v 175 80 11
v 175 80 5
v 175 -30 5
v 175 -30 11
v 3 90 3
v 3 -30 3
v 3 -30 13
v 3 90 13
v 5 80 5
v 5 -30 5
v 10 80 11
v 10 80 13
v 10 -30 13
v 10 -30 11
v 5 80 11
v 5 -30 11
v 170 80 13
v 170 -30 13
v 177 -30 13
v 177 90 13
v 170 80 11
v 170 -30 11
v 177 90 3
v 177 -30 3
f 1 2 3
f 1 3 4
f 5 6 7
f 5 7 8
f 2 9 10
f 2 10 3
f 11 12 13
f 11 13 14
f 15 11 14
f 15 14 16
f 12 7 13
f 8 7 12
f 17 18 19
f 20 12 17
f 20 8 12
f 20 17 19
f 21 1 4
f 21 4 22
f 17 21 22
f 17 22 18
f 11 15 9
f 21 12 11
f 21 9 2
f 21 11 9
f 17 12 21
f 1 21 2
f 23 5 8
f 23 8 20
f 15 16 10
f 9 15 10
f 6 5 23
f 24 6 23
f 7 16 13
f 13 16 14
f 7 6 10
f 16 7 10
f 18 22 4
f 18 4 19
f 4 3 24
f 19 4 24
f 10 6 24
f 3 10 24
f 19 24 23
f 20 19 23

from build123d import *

# Parameters (mm, degrees)
PAD012_DEPTH = 110
BOX_W        = 174
BOX_H        = 120
BOX_DEPTH    = 10


with BuildPart() as pad012:
    # Sketch015 → Pad012 (new body)
    with BuildSketch(Plane.XZ.offset(-110)):
        Polygon((10, 12.723166), (10, 8), (5, 8), (5, 2), (175, 2), (175, 8), (170, 8), (170, 13), align=None)
    extrude(amount=PAD012_DEPTH)


with BuildPart() as pcb_holder:
    # Box → Box (new body)
    with BuildSketch(Plane(origin=(3, 0, 0), x_dir=(1, 0, 0), z_dir=(0, 0, 1))):
        with Locations((87, 60)):
            Rectangle(BOX_W, BOX_H)
    extrude(amount=BOX_DEPTH)

    # Cut003: cut Pad012
    add(pad012.part, mode=Mode.SUBTRACT)


with BuildPart() as pcb_holder_1:
    # Cut003 placement: moved
    add(pcb_holder.part.moved(Location((0, -30, 3))))


solid = pcb_holder_1.part
